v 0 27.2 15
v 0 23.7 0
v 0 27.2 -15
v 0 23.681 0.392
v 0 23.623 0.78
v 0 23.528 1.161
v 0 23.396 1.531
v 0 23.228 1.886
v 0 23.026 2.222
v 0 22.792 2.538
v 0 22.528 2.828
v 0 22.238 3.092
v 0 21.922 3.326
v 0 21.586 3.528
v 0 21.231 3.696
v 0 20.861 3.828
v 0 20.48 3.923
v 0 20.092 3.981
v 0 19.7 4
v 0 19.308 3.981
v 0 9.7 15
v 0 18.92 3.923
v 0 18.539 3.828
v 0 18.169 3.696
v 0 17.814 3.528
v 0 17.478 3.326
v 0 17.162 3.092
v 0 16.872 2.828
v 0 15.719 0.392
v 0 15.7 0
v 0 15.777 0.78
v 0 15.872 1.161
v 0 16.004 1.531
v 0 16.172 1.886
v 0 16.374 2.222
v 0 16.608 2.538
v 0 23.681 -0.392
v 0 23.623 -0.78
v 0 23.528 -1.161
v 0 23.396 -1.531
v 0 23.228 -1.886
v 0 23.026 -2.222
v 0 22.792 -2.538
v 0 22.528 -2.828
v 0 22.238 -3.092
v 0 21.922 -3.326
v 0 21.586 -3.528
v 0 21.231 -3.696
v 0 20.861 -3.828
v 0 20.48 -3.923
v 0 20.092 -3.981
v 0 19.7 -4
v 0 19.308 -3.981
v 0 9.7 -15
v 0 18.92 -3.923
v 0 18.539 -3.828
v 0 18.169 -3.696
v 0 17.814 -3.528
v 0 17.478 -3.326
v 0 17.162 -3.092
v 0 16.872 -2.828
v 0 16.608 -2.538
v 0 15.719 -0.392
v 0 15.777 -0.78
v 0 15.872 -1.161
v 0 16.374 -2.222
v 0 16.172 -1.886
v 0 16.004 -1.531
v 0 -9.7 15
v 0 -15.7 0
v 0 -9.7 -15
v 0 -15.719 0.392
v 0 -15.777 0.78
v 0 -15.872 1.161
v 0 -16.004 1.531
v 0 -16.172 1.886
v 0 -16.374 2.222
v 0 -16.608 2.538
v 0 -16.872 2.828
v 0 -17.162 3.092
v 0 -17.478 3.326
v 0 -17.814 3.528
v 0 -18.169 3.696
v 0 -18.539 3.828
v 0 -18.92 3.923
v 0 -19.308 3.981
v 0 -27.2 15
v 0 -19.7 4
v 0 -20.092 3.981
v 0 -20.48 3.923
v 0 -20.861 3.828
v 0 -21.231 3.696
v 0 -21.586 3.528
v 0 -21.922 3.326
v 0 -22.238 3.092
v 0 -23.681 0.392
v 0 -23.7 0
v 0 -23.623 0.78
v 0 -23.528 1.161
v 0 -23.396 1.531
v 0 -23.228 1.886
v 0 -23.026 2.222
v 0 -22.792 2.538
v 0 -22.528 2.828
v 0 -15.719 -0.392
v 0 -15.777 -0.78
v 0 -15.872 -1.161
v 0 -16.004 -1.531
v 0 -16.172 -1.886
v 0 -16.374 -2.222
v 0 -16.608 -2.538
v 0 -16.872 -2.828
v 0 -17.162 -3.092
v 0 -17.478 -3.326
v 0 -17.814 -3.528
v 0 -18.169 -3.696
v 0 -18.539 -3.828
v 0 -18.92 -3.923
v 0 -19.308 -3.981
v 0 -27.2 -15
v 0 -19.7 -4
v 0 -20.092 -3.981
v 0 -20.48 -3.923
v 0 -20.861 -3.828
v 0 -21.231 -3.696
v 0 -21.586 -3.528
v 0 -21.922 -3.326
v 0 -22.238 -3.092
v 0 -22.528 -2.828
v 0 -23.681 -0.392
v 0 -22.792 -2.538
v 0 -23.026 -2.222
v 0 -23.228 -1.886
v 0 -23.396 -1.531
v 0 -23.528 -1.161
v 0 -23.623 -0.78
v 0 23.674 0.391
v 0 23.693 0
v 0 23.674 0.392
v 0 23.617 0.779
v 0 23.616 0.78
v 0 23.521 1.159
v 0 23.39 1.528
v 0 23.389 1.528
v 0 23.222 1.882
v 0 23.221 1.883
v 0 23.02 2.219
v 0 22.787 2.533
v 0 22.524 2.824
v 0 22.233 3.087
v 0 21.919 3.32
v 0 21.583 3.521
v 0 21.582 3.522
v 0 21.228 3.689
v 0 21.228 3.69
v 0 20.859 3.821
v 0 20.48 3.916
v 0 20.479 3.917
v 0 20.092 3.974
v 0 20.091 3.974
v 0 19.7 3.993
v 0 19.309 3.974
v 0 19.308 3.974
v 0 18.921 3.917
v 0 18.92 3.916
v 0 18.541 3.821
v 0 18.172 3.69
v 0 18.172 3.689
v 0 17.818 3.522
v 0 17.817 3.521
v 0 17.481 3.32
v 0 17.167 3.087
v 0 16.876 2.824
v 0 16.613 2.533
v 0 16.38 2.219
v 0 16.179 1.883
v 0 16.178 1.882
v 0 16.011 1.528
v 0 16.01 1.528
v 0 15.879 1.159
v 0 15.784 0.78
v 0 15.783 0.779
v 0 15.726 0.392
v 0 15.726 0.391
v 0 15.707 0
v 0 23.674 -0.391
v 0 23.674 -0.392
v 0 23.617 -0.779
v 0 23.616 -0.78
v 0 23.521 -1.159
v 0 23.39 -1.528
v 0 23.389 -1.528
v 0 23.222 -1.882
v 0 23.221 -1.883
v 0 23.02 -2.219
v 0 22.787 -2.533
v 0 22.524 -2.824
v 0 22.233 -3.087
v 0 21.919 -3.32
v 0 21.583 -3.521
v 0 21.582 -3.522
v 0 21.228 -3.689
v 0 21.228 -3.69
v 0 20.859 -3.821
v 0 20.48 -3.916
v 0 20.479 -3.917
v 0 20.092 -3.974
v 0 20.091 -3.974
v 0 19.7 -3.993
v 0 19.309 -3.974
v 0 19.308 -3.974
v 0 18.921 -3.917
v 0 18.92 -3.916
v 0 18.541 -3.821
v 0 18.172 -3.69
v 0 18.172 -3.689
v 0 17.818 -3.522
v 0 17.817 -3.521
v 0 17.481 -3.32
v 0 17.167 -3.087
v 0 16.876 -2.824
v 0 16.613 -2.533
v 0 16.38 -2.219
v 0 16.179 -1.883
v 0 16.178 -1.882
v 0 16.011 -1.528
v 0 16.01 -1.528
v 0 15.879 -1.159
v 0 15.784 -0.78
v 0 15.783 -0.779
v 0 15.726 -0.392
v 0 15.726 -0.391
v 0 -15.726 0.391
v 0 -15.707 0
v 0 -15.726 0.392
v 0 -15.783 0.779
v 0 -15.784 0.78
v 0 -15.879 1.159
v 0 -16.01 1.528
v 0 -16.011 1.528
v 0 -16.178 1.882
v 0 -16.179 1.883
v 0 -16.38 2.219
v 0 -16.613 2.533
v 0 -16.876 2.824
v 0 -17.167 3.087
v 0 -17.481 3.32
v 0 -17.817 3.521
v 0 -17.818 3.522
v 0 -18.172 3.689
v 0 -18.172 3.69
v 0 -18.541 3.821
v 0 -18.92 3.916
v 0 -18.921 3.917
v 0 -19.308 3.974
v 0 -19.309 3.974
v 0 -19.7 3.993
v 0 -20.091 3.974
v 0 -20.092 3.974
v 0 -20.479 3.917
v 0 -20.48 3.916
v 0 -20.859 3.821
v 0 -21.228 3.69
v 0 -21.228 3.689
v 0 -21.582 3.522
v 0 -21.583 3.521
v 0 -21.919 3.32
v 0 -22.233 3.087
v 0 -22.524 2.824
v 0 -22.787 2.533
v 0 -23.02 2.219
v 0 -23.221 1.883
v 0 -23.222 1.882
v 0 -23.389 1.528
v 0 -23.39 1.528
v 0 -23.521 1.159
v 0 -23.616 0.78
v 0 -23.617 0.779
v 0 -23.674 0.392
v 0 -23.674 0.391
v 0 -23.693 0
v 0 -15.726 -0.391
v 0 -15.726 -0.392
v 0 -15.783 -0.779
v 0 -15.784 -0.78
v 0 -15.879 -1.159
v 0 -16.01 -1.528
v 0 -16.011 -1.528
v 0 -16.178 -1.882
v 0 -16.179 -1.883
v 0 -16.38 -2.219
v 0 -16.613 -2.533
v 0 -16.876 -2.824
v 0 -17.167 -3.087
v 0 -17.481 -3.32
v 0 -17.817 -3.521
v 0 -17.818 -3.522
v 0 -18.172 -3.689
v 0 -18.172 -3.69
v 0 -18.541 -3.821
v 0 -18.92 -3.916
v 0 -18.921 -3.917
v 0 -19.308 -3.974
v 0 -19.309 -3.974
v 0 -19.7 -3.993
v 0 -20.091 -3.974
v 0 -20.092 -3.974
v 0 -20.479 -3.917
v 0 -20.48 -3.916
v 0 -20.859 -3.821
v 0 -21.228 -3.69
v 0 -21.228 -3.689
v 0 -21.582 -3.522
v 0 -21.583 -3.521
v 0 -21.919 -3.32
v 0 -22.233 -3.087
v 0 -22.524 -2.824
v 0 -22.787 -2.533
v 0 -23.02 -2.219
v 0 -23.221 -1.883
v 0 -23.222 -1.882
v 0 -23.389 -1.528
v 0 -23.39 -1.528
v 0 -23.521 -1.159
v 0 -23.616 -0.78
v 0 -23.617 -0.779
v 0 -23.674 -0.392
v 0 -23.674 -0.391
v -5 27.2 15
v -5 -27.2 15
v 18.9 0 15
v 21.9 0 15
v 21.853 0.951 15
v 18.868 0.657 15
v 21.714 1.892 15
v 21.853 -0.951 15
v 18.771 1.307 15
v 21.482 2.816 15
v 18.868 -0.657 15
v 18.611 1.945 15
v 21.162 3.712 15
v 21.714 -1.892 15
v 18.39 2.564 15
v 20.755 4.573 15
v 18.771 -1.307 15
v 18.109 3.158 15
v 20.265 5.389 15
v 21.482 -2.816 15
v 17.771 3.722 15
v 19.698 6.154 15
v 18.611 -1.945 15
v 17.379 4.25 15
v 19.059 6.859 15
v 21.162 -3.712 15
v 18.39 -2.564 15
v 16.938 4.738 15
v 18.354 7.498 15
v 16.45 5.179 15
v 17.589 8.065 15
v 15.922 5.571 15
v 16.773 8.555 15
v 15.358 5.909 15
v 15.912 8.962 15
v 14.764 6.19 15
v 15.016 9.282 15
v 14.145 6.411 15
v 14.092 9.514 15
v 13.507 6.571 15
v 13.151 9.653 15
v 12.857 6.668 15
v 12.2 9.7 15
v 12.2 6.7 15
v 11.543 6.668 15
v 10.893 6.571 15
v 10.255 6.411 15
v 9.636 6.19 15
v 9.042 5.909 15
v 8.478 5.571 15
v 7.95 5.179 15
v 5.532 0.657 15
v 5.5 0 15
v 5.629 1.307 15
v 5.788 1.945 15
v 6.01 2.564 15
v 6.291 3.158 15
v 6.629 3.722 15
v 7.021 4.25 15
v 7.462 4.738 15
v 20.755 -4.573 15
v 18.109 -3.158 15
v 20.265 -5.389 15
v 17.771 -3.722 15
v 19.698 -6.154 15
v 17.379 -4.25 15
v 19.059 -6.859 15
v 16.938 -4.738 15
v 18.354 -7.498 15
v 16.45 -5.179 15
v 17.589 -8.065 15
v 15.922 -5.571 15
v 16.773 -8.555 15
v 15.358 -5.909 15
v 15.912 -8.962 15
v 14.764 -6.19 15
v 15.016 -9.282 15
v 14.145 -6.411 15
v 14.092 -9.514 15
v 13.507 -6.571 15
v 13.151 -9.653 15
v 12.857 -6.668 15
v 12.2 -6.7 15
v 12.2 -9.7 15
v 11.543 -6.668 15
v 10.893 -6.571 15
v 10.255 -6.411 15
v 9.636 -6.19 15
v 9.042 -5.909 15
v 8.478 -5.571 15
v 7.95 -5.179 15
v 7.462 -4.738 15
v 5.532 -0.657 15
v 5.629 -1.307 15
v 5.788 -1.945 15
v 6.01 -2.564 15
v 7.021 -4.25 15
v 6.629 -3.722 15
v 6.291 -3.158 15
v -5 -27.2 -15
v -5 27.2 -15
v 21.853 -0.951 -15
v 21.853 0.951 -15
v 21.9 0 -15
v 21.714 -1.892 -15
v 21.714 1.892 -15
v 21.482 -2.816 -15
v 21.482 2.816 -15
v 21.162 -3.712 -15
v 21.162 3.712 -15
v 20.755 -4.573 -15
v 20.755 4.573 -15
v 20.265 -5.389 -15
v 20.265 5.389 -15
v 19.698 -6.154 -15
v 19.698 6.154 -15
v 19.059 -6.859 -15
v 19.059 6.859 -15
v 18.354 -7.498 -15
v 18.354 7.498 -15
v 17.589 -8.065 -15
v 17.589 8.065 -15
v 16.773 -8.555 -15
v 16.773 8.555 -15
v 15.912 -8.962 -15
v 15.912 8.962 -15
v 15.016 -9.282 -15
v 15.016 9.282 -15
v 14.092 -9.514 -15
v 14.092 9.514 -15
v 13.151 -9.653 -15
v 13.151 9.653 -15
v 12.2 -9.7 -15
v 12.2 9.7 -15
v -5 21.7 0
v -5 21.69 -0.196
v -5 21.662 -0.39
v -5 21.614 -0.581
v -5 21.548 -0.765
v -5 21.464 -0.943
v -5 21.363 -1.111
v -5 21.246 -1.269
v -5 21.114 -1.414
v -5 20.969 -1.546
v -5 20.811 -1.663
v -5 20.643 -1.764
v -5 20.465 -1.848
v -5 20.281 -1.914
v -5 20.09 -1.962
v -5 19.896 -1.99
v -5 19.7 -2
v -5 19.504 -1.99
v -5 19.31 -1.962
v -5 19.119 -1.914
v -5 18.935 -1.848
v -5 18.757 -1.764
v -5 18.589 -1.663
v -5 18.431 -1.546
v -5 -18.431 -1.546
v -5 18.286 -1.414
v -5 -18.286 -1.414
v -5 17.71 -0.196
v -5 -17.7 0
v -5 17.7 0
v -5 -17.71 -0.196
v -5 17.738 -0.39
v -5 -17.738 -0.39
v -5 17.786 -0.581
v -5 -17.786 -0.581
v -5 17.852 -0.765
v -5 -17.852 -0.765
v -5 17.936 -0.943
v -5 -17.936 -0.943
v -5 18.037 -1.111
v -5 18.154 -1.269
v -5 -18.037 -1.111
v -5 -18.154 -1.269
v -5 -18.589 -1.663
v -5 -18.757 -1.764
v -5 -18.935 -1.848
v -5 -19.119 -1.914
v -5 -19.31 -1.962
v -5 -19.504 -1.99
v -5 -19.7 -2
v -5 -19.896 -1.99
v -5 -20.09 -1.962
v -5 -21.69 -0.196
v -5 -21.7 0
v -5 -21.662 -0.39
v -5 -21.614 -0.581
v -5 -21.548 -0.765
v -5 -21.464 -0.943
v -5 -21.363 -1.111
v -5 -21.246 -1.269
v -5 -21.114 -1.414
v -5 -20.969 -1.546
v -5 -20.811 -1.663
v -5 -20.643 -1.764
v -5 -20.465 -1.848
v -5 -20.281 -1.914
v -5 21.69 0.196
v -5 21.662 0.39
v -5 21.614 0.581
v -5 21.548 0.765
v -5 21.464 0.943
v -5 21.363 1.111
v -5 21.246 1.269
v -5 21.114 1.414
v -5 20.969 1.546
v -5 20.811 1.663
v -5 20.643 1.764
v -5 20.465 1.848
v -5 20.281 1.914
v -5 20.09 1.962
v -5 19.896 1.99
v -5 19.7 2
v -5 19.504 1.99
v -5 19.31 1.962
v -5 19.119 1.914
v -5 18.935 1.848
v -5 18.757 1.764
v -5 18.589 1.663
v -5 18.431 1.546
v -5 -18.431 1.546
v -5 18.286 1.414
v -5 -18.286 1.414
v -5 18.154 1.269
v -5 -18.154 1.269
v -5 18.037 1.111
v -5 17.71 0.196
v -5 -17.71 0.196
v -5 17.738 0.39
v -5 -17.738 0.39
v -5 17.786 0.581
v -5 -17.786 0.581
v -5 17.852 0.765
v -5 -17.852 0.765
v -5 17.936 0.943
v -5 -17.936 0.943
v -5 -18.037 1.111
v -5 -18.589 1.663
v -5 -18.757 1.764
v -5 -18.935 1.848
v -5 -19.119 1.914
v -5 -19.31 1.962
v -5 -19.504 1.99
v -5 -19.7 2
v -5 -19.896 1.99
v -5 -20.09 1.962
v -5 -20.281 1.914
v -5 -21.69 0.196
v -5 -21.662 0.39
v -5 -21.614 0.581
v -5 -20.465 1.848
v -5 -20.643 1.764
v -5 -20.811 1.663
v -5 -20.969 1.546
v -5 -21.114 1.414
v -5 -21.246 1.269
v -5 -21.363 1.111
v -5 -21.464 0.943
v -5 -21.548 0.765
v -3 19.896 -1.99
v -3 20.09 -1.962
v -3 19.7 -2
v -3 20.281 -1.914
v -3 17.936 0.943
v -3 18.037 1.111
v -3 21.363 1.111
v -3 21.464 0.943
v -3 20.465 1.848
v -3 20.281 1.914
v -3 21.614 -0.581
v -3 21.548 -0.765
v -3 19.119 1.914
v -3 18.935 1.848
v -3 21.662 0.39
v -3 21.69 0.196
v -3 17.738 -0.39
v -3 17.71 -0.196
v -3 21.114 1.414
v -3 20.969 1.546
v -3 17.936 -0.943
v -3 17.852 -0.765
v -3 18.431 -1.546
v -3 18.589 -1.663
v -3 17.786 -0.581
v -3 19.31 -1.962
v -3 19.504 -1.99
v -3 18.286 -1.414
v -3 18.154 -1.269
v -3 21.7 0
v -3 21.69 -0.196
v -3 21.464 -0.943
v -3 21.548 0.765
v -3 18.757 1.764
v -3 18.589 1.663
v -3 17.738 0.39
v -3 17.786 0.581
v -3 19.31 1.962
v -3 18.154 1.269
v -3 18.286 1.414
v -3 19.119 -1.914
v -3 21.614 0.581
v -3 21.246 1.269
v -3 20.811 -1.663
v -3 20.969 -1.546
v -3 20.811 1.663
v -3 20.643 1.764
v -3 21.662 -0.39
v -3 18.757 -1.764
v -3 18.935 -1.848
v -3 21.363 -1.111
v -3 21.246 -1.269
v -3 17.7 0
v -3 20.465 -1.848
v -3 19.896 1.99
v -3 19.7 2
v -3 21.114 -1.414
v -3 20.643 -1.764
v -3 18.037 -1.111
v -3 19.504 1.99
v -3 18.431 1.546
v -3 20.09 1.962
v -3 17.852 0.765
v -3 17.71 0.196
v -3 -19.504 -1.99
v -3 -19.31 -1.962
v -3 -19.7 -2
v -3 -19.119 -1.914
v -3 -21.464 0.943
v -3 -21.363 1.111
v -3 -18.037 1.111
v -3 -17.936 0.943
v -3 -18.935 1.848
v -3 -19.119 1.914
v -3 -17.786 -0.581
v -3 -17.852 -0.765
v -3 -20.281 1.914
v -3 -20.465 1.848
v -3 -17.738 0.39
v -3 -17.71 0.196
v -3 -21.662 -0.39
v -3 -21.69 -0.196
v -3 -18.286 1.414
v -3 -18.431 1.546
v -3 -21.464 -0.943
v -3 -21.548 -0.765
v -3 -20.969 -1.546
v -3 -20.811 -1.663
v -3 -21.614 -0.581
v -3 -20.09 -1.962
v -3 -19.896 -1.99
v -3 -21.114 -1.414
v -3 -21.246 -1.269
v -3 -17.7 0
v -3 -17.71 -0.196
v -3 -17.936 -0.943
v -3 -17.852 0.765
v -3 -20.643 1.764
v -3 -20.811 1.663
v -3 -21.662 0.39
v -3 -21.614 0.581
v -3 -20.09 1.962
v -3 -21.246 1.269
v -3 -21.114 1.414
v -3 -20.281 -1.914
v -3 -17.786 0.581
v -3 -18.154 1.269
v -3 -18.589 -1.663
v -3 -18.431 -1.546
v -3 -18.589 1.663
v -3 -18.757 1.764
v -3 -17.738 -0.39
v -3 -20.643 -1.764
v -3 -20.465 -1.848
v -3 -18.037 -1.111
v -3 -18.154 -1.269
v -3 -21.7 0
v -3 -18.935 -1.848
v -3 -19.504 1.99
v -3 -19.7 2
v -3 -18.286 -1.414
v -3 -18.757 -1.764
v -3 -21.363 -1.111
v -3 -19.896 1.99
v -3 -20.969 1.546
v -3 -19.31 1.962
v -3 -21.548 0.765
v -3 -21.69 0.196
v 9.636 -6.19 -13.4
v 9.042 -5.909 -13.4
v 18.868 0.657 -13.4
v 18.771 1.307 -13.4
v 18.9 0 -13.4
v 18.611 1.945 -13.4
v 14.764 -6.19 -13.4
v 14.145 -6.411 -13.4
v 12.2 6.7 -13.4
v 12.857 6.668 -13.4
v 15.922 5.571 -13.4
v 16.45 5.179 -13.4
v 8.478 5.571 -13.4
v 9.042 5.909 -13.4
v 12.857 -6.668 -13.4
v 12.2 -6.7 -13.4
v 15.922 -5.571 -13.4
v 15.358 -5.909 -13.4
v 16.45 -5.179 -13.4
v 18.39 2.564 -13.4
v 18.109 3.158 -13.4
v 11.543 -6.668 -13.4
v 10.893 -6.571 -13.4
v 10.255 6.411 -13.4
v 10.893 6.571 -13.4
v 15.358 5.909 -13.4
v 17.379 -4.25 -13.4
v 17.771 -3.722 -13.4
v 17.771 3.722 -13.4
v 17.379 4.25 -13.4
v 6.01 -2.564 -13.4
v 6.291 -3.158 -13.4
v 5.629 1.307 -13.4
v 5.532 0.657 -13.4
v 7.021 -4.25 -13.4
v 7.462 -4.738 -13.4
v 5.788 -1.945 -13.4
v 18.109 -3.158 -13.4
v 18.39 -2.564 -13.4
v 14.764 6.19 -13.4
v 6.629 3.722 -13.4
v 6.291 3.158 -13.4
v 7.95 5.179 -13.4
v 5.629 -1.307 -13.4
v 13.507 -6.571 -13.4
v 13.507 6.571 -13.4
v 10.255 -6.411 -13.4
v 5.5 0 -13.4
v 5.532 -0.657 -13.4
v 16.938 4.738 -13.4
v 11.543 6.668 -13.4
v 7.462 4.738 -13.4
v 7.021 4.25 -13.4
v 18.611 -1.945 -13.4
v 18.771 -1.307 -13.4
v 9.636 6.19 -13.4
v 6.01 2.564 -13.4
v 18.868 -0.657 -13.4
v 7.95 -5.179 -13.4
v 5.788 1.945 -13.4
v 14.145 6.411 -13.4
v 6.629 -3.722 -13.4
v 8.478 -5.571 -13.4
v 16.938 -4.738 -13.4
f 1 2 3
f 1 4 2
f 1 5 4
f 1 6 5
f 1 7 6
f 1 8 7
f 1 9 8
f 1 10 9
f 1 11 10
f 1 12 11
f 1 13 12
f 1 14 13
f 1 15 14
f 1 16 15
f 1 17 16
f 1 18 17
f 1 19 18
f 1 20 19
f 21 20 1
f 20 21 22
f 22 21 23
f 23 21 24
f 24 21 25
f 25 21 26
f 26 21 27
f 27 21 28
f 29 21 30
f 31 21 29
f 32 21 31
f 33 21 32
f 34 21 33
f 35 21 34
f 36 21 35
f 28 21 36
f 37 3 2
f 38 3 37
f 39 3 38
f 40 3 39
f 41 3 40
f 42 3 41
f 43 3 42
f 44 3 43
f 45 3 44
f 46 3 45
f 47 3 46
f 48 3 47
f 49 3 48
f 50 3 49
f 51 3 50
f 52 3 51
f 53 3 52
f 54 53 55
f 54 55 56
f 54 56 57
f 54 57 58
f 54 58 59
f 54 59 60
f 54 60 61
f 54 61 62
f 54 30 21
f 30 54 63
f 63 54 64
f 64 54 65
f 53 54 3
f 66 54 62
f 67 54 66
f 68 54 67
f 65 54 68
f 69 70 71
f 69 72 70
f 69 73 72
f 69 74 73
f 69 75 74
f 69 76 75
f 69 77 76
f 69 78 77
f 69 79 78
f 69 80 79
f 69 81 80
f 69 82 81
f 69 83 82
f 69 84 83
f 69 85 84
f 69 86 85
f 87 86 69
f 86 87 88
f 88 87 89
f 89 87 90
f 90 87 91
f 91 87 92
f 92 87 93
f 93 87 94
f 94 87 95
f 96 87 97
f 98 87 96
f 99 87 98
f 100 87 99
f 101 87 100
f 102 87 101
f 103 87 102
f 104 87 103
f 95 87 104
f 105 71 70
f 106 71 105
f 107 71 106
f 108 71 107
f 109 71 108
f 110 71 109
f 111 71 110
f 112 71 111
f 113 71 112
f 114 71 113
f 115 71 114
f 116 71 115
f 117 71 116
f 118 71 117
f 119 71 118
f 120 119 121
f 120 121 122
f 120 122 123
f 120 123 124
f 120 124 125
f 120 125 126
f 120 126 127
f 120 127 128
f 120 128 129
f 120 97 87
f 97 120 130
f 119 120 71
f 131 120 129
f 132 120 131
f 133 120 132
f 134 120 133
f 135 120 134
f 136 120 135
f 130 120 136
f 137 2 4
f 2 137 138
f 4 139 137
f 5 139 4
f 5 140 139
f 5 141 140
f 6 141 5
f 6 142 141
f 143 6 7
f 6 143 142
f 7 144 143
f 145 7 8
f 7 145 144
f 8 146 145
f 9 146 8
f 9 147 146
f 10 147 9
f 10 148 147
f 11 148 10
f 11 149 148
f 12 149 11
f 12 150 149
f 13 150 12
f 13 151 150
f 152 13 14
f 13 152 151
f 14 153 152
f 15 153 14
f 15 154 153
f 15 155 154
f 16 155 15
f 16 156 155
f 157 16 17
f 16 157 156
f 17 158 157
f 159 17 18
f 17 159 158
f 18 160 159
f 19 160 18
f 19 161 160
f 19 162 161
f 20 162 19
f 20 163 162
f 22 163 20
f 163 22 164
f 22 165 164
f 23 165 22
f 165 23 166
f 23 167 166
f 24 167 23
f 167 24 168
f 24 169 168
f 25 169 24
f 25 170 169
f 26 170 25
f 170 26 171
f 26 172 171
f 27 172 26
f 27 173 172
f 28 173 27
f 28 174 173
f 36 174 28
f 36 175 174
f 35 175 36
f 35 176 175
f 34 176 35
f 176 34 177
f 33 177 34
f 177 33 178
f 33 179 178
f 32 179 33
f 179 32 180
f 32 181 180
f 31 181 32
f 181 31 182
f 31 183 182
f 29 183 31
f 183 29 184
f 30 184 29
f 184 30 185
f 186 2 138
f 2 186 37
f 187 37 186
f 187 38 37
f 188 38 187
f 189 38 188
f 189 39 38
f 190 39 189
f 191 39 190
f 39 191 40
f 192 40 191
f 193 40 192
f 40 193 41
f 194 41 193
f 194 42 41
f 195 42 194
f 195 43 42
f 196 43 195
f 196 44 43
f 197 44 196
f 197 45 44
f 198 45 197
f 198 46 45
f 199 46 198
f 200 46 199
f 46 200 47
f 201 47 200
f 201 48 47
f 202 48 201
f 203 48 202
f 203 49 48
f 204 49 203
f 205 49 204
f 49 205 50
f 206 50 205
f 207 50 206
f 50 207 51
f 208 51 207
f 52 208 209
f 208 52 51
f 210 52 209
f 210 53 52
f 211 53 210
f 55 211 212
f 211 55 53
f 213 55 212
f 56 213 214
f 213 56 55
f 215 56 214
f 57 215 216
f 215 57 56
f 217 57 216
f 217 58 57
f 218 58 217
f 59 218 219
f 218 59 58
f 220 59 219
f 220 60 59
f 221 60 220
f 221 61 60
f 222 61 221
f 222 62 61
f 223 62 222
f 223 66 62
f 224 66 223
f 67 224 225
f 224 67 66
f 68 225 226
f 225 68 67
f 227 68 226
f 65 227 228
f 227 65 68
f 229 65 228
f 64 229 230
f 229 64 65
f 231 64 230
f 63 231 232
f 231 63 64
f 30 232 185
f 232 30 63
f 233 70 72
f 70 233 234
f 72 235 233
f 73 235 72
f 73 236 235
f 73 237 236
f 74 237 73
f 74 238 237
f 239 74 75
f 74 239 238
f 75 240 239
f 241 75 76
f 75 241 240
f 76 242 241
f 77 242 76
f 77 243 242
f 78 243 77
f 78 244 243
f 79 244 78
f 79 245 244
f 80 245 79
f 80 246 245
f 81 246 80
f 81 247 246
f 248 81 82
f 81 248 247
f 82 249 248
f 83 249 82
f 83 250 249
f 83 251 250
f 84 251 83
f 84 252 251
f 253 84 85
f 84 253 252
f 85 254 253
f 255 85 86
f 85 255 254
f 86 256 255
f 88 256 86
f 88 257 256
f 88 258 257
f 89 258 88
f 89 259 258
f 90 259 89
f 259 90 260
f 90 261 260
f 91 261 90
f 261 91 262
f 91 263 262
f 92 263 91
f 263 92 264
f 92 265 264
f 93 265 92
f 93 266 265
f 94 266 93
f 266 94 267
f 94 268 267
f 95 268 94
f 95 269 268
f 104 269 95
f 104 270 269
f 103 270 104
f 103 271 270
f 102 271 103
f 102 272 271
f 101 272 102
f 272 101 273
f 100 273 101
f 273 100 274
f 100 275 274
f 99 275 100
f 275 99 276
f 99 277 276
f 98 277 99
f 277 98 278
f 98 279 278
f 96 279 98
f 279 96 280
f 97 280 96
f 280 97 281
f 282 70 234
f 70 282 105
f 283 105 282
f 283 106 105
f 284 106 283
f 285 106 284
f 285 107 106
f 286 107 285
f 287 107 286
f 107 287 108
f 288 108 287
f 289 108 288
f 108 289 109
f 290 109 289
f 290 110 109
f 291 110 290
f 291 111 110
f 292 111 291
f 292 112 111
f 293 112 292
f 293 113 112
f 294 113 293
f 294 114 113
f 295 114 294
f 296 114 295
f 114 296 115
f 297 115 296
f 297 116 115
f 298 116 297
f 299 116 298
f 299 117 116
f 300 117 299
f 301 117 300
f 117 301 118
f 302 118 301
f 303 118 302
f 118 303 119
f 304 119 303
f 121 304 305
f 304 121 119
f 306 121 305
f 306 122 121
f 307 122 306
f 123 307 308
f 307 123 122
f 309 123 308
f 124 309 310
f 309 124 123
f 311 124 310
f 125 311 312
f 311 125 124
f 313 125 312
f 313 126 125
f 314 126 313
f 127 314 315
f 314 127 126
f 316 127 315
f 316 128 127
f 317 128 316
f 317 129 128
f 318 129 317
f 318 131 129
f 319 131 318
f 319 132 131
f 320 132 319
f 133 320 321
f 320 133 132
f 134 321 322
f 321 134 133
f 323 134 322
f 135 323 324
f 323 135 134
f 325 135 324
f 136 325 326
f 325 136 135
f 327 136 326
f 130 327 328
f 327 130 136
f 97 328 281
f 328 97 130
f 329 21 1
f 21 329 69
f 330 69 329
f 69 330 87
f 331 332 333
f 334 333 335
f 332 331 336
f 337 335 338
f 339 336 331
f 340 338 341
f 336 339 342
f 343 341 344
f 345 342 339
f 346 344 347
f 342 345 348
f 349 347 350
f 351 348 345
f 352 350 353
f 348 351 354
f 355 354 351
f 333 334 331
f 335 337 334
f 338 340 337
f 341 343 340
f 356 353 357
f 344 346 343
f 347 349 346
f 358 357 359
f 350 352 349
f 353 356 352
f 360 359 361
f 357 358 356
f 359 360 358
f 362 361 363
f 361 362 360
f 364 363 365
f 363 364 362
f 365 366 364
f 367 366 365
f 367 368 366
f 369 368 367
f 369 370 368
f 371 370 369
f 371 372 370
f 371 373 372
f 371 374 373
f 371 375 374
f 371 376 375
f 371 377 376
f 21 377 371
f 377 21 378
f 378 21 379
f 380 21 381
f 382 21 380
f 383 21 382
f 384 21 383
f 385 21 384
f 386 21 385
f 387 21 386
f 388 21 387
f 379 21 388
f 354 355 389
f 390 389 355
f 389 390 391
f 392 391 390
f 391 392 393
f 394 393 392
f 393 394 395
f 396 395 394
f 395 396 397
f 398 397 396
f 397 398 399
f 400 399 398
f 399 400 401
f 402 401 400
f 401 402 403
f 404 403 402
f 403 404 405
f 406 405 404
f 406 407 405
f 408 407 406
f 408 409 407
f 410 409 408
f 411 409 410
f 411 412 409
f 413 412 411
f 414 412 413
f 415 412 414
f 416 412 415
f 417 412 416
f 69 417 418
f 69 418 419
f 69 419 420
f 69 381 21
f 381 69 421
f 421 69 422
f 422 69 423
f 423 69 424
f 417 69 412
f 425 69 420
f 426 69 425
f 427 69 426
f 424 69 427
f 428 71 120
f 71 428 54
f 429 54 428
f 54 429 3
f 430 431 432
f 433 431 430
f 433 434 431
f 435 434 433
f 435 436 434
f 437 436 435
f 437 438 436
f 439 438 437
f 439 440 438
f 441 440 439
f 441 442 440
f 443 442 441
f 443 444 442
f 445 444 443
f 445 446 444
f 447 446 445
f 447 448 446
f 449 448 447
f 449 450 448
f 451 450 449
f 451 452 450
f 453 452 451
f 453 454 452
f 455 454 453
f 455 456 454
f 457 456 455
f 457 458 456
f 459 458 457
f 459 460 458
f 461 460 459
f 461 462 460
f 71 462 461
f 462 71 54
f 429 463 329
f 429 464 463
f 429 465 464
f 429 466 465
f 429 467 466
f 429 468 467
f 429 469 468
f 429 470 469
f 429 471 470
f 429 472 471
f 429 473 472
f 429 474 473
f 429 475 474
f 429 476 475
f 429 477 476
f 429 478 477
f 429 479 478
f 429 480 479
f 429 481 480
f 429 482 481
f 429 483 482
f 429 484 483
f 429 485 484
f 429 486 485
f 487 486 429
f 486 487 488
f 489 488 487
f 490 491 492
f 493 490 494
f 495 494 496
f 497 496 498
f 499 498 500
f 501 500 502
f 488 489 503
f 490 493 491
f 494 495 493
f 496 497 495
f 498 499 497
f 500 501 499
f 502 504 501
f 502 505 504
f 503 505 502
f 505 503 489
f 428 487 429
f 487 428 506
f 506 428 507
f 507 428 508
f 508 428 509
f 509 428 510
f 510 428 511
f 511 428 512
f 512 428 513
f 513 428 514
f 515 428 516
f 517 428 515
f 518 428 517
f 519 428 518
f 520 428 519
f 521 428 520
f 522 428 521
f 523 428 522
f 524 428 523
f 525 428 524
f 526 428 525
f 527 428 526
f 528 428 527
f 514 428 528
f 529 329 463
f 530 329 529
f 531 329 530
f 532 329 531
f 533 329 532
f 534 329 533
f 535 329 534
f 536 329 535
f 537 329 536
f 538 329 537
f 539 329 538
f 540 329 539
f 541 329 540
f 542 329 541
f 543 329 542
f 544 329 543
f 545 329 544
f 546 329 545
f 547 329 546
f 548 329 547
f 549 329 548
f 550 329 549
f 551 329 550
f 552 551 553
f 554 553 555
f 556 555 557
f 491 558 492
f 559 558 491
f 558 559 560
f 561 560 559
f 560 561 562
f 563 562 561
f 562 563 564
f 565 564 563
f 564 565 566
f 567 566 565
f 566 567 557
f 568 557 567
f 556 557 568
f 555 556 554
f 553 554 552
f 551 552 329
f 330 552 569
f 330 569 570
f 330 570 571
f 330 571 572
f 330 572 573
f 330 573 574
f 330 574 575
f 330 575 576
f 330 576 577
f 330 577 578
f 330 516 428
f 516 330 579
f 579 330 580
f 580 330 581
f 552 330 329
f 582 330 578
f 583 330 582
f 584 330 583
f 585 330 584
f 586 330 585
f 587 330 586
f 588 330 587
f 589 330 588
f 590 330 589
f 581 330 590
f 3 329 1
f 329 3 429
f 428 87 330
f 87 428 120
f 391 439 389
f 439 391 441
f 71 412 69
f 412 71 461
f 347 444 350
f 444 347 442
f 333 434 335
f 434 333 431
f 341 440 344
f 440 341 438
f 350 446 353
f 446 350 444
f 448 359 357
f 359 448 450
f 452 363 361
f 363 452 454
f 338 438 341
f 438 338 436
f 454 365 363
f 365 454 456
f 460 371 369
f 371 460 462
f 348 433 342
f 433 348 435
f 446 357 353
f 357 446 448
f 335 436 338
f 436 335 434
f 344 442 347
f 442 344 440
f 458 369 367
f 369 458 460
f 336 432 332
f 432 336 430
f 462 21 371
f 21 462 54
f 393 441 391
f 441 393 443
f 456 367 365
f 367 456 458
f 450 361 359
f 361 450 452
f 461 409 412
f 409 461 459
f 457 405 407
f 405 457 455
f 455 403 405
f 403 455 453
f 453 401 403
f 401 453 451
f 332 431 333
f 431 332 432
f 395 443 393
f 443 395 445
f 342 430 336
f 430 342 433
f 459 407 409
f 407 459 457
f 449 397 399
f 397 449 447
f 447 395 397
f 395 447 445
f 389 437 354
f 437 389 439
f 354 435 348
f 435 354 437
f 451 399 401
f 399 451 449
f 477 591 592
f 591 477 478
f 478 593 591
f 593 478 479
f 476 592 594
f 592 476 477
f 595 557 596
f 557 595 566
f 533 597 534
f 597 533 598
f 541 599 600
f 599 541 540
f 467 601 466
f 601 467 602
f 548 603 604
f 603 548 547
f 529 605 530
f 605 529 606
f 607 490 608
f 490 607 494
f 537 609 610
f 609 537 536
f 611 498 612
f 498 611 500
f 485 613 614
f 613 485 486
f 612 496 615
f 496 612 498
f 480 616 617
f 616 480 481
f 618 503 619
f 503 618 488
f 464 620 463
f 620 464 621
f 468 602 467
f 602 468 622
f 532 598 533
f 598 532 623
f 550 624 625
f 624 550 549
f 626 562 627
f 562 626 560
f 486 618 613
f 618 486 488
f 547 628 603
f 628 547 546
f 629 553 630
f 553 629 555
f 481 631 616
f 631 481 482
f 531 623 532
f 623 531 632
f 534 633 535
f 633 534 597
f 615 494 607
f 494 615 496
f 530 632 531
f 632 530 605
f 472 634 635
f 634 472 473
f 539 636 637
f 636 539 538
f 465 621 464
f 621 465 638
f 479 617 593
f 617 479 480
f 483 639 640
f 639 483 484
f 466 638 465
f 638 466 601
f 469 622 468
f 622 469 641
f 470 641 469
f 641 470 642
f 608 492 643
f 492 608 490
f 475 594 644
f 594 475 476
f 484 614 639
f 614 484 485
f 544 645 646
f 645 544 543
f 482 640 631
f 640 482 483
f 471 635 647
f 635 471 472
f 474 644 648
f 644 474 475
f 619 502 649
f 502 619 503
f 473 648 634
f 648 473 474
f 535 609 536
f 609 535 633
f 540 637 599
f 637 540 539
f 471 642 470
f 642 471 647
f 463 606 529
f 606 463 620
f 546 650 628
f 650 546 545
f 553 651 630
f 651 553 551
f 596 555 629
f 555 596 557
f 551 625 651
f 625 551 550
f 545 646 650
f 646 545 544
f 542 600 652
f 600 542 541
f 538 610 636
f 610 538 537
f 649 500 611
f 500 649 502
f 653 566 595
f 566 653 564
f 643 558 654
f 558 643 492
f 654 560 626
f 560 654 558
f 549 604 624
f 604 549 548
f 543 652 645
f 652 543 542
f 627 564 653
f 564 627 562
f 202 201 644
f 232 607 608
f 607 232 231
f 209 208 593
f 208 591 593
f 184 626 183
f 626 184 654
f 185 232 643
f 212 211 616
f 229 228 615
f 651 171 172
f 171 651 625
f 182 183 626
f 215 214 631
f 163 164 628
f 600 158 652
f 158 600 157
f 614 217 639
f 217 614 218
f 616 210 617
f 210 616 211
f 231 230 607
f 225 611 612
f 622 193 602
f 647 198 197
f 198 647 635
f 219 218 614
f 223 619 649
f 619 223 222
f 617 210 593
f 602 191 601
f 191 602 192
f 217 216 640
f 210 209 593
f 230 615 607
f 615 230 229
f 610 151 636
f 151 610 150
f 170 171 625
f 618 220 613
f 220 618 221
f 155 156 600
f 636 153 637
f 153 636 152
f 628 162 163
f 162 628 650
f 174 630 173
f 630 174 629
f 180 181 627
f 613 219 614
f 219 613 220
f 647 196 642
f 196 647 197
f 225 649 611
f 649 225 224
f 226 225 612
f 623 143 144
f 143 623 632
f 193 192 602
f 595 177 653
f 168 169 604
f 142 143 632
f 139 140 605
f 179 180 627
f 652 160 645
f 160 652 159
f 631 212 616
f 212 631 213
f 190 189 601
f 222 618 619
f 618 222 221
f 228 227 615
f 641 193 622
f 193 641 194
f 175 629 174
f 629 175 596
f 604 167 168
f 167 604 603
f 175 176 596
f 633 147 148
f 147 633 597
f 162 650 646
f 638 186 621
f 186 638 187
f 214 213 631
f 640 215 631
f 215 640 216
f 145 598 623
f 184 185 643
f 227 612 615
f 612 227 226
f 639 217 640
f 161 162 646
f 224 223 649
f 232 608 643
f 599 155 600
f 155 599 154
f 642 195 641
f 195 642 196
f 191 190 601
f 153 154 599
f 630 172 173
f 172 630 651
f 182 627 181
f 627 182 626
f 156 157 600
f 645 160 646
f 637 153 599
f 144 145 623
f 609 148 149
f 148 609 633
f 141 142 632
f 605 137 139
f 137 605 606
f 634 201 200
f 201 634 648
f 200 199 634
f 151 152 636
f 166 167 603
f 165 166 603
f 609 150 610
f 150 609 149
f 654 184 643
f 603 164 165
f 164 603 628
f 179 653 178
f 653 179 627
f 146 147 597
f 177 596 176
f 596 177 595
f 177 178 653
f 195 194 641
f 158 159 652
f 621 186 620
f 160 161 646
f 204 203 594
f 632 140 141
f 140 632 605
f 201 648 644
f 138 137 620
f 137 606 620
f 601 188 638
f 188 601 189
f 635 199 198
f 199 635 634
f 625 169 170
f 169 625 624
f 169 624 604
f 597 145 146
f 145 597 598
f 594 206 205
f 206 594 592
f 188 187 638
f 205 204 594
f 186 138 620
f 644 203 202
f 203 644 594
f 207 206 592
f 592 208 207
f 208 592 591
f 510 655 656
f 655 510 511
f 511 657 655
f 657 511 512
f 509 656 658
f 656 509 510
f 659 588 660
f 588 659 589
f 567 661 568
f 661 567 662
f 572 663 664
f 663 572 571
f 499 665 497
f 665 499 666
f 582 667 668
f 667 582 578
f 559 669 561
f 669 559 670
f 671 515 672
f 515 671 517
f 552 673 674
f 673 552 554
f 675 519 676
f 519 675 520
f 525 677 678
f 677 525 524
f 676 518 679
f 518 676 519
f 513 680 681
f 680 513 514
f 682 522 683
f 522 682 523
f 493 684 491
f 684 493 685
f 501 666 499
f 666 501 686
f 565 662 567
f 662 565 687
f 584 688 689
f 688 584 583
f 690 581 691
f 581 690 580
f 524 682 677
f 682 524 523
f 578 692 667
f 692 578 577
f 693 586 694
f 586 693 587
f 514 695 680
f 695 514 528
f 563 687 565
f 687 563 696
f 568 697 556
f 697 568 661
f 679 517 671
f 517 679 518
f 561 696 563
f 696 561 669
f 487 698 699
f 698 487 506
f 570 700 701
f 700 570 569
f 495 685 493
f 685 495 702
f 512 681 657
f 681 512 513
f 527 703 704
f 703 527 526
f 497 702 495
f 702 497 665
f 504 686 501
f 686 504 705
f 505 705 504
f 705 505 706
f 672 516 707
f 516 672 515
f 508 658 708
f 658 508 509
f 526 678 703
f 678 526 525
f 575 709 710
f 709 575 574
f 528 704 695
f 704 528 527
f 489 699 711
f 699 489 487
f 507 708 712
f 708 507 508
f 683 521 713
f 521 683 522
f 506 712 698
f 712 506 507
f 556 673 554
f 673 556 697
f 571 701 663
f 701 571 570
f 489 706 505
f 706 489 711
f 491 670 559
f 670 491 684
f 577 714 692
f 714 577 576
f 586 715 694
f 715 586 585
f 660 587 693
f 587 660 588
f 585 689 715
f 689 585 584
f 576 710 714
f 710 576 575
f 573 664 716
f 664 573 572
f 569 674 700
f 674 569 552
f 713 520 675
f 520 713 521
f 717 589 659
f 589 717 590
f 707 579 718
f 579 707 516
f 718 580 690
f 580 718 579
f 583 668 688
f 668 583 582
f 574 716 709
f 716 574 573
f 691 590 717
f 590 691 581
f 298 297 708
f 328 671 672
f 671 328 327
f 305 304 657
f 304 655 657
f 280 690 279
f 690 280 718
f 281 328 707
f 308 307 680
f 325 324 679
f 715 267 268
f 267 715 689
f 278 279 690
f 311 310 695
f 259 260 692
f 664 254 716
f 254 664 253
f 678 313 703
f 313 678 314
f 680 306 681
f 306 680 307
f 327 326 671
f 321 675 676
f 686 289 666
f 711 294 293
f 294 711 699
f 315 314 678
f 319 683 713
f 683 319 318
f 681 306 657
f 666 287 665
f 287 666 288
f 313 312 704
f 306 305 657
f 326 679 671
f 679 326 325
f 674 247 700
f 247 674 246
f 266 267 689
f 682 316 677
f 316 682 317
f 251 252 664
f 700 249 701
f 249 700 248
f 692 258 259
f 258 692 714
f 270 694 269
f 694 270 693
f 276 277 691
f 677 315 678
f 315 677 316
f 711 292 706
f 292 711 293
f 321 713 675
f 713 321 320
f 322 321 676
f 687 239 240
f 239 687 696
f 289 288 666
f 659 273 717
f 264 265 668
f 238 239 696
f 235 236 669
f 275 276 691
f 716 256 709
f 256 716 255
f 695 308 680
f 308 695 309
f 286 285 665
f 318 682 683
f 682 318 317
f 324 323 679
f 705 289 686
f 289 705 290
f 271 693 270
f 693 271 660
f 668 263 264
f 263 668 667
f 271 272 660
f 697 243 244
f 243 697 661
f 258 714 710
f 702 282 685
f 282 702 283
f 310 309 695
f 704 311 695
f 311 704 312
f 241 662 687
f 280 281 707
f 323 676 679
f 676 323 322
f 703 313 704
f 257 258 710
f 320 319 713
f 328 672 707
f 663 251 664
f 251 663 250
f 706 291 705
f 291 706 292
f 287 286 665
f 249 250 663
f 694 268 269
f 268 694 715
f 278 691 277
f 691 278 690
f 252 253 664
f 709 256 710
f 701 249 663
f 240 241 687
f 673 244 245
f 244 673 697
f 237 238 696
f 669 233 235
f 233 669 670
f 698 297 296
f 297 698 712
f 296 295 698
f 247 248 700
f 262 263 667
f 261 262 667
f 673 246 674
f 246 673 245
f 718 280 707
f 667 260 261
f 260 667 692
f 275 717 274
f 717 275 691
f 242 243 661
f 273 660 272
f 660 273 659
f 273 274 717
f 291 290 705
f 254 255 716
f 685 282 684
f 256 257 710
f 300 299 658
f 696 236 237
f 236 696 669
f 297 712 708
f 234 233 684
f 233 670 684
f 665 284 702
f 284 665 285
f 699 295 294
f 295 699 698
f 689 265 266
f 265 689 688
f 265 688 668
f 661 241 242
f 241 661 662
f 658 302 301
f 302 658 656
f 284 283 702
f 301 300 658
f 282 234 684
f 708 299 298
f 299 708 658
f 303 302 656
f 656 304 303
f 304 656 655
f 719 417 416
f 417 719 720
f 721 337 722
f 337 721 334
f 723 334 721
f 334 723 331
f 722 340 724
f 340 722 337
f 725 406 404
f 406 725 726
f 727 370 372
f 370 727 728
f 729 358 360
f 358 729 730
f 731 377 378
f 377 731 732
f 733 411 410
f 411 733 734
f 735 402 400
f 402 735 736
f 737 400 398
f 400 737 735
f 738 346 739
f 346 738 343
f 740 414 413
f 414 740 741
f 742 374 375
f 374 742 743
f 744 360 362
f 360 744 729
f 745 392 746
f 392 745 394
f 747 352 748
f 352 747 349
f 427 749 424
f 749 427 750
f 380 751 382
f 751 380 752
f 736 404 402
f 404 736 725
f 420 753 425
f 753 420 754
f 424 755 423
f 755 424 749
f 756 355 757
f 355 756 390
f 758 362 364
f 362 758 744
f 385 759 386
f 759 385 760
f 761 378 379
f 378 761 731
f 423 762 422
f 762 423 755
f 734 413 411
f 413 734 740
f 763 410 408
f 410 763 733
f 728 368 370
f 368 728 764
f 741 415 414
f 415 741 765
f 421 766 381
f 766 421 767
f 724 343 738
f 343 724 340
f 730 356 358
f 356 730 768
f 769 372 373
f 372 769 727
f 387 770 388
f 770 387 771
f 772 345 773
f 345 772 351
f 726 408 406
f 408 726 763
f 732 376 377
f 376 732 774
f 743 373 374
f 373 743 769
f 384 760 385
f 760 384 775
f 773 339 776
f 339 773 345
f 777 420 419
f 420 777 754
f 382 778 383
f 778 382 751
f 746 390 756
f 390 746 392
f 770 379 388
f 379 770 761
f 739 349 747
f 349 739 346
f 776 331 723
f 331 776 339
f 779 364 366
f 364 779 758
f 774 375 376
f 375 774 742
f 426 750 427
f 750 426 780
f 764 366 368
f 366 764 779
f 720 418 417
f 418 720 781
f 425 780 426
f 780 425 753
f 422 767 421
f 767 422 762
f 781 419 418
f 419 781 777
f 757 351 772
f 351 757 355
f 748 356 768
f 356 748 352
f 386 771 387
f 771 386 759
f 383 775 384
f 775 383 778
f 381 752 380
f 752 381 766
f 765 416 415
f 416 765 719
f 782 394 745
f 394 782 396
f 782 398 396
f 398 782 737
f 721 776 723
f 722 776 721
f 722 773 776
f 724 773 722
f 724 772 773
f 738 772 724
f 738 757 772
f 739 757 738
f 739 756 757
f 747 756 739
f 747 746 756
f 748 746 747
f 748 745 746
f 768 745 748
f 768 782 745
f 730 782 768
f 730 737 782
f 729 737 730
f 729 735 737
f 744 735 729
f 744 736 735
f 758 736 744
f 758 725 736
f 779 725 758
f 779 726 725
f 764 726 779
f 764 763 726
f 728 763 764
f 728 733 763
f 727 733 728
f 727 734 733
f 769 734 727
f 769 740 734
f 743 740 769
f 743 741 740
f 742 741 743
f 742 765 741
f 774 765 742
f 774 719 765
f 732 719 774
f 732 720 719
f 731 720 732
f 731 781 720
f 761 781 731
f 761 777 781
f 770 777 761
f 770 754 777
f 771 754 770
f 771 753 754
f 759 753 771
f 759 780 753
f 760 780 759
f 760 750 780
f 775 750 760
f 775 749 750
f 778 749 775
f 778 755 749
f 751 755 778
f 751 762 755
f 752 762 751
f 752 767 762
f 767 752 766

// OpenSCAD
$fn = 64;

pole_diameter = 12.0;
pole_insert_depth = 30.0;
pole_clearance = 1.4; // includes ~1mm 3D print shrinkage compensation

holder_wall_thickness = 3.0;
holder_od = pole_diameter + pole_clearance + (holder_wall_thickness * 2);

base_thickness = 5.0;
base_height = pole_insert_depth;

screw_hole_spacing = holder_od + 20.0;
base_width = screw_hole_spacing + 15.0;

screw_hole_diameter = 4.0;
screw_head_diameter = 8.0;
screw_head_countersink_depth = 3.0;

module screw_hole_countersunk() {
  rotate([0, 90, 0]) {
    cylinder(d = screw_hole_diameter, h = base_thickness * 3, center = true);

    translate([0, 0, -screw_head_countersink_depth])
      cylinder(d1 = screw_hole_diameter, d2 = screw_head_diameter, h = screw_head_countersink_depth + 0.01); // +0.01 to avoid z-fighting

    cylinder(d = screw_head_diameter, h = 10);
  }
}

module light_stand_holder() {
  difference() {
    union() {
      translate([-base_thickness/2, 0, 0])
        cube([base_thickness, base_width, base_height], center = true);

      // Thin slice as hull source for smooth base-to-holder transition
      hull() {
        translate([-base_thickness/2 + 0.1, 0, 0])
           cube([0.1, holder_od, base_height], center = true);

        translate([holder_od/2 + base_thickness/2, 0, 0])
           cylinder(d = holder_od, h = base_height, center = true);
      }
    }

    // Pole hole (2mm floor at bottom)
    translate([holder_od/2 + base_thickness/2, 0, base_height/2 - pole_insert_depth/2 + 0.1])
      translate([0, 0, 2])
        cylinder(d = pole_diameter + pole_clearance, h = pole_insert_depth + 1, center = true);

    translate([0, screw_hole_spacing/2, 0])
      screw_hole_countersunk();

    translate([0, -screw_hole_spacing/2, 0])
      screw_hole_countersunk();
  }
}

light_stand_holder();
